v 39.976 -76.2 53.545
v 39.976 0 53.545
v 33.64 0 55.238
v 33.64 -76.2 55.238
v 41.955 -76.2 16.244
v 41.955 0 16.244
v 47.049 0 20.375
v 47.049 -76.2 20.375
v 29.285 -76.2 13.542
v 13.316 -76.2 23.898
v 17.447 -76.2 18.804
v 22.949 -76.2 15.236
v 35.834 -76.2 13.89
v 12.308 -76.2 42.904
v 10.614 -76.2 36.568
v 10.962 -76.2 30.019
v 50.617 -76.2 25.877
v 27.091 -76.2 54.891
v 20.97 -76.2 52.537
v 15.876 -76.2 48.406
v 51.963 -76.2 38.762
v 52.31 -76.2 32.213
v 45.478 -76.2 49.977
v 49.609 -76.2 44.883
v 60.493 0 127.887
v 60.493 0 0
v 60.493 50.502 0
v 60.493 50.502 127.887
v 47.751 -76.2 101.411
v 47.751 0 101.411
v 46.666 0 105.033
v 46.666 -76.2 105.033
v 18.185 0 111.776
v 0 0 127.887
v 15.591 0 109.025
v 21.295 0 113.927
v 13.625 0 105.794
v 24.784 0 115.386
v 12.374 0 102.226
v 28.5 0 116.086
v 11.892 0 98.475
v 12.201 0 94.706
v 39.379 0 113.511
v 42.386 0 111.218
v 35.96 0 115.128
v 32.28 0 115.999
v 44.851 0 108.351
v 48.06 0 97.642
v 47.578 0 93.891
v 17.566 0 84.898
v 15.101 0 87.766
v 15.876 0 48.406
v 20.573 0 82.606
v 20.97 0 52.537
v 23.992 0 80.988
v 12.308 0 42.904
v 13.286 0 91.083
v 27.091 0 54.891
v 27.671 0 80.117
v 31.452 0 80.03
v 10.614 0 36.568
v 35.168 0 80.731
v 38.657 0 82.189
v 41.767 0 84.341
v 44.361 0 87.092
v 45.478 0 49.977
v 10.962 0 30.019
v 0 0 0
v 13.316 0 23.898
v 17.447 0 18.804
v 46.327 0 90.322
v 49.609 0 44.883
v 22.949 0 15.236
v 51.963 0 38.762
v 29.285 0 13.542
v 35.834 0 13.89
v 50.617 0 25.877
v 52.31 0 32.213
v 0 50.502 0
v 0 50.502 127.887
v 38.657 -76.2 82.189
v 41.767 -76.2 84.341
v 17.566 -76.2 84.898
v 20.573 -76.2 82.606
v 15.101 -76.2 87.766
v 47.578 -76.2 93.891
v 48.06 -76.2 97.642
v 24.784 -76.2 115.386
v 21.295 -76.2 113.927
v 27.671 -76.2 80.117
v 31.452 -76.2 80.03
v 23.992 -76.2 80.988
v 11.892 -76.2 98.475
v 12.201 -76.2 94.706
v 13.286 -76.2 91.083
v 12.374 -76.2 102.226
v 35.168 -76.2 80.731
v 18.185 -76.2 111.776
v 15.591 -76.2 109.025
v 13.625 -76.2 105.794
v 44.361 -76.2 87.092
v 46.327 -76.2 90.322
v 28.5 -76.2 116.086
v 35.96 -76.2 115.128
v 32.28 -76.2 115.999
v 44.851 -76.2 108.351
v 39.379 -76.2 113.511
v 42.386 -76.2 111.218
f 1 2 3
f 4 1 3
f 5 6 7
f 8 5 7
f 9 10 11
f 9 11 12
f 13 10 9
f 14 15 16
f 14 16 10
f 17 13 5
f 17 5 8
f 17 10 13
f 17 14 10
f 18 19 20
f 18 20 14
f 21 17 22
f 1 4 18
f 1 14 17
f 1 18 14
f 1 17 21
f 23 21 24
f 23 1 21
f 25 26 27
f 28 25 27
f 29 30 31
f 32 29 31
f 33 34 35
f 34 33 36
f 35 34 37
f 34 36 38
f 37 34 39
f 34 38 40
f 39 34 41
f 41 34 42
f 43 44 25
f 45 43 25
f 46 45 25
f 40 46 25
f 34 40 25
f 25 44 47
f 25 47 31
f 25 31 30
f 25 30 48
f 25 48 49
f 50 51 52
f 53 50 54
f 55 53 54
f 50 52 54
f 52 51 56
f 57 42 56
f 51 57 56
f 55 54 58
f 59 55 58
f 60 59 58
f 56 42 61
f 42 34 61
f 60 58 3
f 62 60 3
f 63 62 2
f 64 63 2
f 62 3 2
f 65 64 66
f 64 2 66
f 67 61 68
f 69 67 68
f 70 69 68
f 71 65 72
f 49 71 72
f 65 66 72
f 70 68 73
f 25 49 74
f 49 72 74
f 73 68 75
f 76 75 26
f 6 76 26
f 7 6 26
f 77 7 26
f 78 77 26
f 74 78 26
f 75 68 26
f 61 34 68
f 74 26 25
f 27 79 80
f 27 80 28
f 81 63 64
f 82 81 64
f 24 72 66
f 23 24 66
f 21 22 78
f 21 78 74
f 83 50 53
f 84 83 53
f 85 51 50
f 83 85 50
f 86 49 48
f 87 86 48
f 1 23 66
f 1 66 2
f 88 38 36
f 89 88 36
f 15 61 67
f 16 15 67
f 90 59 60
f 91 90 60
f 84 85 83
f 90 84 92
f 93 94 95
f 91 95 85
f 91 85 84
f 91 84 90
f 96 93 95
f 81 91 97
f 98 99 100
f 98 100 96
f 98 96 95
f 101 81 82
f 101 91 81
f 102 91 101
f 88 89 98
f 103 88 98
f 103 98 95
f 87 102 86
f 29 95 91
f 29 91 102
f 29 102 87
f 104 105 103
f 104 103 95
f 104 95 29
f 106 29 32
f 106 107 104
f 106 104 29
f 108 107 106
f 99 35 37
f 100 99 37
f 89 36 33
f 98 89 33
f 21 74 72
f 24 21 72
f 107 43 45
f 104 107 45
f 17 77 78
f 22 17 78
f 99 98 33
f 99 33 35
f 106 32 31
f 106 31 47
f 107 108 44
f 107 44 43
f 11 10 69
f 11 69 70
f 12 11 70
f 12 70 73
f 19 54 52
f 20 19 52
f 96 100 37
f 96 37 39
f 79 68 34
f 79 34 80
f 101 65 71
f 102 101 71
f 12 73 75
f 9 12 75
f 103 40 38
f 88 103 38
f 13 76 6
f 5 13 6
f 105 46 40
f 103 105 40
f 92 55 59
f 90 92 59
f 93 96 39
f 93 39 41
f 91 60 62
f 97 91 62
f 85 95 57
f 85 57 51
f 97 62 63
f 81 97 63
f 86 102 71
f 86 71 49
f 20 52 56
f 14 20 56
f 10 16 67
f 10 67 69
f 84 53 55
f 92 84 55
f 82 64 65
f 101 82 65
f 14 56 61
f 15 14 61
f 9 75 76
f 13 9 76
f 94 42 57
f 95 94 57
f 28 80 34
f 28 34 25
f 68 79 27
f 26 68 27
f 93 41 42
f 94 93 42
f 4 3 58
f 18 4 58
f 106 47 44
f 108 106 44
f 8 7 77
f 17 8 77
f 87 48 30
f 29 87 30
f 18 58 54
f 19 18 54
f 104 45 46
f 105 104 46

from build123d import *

# Parameters (mm, degrees)
F0_W     = 60.493108
F0_H     = 50.502148
F1_DEPTH = 127.8868
F3_DEPTH = 76.2


with BuildPart() as f1:
    # F0 (on Top) → F1 (new body)
    with BuildSketch(Plane.XY):
        with Locations((30.246554, 25.251074)):
            Rectangle(F0_W, F0_H)
    extrude(amount=F1_DEPTH)

    # F2 (on face) → F3 (join)
    with BuildSketch(Plane.XZ):
        Polygon((35.168027, 80.730942), (38.657124, 82.189071), (41.766813, 84.34076), (44.361187, 87.091971), (46.326859, 90.322462), (47.57792, 93.891045), (48.059691, 97.641756), (47.751118, 101.410671), (46.665687, 105.03307), (44.850836, 108.350637), (42.385883, 111.218379), (39.378557, 113.510961), (35.960295, 115.128186), (32.28049, 115.999375), (28.499966, 116.086451), (24.783953, 115.38561), (21.294856, 113.927481), (18.185166, 111.775791), (15.590792, 109.024581), (13.62512, 105.79409), (12.37406, 102.225507), (11.892288, 98.474796), (12.200861, 94.705881), (13.286293, 91.083482), (15.101144, 87.765915), (17.566097, 84.898173), (20.573422, 82.605591), (23.991685, 80.988365), (27.67149, 80.117177), (31.452013, 80.030101), align=None)
        Polygon((35.833944, 13.889787), (41.954983, 16.244033), (47.048936, 20.374559), (50.617169, 25.877041), (52.310401, 32.212857), (51.962885, 38.761813), (49.608639, 44.882853), (45.478113, 49.976805), (39.975631, 53.545039), (33.639815, 55.238271), (27.090859, 54.890755), (20.969819, 52.536509), (15.875867, 48.405983), (12.307633, 42.903501), (10.614401, 36.567685), (10.961917, 30.018728), (13.316163, 23.897689), (17.446689, 18.803736), (22.949171, 15.235502), (29.284987, 13.542271), align=None)
    extrude(amount=F3_DEPTH)


solid = f1.part
